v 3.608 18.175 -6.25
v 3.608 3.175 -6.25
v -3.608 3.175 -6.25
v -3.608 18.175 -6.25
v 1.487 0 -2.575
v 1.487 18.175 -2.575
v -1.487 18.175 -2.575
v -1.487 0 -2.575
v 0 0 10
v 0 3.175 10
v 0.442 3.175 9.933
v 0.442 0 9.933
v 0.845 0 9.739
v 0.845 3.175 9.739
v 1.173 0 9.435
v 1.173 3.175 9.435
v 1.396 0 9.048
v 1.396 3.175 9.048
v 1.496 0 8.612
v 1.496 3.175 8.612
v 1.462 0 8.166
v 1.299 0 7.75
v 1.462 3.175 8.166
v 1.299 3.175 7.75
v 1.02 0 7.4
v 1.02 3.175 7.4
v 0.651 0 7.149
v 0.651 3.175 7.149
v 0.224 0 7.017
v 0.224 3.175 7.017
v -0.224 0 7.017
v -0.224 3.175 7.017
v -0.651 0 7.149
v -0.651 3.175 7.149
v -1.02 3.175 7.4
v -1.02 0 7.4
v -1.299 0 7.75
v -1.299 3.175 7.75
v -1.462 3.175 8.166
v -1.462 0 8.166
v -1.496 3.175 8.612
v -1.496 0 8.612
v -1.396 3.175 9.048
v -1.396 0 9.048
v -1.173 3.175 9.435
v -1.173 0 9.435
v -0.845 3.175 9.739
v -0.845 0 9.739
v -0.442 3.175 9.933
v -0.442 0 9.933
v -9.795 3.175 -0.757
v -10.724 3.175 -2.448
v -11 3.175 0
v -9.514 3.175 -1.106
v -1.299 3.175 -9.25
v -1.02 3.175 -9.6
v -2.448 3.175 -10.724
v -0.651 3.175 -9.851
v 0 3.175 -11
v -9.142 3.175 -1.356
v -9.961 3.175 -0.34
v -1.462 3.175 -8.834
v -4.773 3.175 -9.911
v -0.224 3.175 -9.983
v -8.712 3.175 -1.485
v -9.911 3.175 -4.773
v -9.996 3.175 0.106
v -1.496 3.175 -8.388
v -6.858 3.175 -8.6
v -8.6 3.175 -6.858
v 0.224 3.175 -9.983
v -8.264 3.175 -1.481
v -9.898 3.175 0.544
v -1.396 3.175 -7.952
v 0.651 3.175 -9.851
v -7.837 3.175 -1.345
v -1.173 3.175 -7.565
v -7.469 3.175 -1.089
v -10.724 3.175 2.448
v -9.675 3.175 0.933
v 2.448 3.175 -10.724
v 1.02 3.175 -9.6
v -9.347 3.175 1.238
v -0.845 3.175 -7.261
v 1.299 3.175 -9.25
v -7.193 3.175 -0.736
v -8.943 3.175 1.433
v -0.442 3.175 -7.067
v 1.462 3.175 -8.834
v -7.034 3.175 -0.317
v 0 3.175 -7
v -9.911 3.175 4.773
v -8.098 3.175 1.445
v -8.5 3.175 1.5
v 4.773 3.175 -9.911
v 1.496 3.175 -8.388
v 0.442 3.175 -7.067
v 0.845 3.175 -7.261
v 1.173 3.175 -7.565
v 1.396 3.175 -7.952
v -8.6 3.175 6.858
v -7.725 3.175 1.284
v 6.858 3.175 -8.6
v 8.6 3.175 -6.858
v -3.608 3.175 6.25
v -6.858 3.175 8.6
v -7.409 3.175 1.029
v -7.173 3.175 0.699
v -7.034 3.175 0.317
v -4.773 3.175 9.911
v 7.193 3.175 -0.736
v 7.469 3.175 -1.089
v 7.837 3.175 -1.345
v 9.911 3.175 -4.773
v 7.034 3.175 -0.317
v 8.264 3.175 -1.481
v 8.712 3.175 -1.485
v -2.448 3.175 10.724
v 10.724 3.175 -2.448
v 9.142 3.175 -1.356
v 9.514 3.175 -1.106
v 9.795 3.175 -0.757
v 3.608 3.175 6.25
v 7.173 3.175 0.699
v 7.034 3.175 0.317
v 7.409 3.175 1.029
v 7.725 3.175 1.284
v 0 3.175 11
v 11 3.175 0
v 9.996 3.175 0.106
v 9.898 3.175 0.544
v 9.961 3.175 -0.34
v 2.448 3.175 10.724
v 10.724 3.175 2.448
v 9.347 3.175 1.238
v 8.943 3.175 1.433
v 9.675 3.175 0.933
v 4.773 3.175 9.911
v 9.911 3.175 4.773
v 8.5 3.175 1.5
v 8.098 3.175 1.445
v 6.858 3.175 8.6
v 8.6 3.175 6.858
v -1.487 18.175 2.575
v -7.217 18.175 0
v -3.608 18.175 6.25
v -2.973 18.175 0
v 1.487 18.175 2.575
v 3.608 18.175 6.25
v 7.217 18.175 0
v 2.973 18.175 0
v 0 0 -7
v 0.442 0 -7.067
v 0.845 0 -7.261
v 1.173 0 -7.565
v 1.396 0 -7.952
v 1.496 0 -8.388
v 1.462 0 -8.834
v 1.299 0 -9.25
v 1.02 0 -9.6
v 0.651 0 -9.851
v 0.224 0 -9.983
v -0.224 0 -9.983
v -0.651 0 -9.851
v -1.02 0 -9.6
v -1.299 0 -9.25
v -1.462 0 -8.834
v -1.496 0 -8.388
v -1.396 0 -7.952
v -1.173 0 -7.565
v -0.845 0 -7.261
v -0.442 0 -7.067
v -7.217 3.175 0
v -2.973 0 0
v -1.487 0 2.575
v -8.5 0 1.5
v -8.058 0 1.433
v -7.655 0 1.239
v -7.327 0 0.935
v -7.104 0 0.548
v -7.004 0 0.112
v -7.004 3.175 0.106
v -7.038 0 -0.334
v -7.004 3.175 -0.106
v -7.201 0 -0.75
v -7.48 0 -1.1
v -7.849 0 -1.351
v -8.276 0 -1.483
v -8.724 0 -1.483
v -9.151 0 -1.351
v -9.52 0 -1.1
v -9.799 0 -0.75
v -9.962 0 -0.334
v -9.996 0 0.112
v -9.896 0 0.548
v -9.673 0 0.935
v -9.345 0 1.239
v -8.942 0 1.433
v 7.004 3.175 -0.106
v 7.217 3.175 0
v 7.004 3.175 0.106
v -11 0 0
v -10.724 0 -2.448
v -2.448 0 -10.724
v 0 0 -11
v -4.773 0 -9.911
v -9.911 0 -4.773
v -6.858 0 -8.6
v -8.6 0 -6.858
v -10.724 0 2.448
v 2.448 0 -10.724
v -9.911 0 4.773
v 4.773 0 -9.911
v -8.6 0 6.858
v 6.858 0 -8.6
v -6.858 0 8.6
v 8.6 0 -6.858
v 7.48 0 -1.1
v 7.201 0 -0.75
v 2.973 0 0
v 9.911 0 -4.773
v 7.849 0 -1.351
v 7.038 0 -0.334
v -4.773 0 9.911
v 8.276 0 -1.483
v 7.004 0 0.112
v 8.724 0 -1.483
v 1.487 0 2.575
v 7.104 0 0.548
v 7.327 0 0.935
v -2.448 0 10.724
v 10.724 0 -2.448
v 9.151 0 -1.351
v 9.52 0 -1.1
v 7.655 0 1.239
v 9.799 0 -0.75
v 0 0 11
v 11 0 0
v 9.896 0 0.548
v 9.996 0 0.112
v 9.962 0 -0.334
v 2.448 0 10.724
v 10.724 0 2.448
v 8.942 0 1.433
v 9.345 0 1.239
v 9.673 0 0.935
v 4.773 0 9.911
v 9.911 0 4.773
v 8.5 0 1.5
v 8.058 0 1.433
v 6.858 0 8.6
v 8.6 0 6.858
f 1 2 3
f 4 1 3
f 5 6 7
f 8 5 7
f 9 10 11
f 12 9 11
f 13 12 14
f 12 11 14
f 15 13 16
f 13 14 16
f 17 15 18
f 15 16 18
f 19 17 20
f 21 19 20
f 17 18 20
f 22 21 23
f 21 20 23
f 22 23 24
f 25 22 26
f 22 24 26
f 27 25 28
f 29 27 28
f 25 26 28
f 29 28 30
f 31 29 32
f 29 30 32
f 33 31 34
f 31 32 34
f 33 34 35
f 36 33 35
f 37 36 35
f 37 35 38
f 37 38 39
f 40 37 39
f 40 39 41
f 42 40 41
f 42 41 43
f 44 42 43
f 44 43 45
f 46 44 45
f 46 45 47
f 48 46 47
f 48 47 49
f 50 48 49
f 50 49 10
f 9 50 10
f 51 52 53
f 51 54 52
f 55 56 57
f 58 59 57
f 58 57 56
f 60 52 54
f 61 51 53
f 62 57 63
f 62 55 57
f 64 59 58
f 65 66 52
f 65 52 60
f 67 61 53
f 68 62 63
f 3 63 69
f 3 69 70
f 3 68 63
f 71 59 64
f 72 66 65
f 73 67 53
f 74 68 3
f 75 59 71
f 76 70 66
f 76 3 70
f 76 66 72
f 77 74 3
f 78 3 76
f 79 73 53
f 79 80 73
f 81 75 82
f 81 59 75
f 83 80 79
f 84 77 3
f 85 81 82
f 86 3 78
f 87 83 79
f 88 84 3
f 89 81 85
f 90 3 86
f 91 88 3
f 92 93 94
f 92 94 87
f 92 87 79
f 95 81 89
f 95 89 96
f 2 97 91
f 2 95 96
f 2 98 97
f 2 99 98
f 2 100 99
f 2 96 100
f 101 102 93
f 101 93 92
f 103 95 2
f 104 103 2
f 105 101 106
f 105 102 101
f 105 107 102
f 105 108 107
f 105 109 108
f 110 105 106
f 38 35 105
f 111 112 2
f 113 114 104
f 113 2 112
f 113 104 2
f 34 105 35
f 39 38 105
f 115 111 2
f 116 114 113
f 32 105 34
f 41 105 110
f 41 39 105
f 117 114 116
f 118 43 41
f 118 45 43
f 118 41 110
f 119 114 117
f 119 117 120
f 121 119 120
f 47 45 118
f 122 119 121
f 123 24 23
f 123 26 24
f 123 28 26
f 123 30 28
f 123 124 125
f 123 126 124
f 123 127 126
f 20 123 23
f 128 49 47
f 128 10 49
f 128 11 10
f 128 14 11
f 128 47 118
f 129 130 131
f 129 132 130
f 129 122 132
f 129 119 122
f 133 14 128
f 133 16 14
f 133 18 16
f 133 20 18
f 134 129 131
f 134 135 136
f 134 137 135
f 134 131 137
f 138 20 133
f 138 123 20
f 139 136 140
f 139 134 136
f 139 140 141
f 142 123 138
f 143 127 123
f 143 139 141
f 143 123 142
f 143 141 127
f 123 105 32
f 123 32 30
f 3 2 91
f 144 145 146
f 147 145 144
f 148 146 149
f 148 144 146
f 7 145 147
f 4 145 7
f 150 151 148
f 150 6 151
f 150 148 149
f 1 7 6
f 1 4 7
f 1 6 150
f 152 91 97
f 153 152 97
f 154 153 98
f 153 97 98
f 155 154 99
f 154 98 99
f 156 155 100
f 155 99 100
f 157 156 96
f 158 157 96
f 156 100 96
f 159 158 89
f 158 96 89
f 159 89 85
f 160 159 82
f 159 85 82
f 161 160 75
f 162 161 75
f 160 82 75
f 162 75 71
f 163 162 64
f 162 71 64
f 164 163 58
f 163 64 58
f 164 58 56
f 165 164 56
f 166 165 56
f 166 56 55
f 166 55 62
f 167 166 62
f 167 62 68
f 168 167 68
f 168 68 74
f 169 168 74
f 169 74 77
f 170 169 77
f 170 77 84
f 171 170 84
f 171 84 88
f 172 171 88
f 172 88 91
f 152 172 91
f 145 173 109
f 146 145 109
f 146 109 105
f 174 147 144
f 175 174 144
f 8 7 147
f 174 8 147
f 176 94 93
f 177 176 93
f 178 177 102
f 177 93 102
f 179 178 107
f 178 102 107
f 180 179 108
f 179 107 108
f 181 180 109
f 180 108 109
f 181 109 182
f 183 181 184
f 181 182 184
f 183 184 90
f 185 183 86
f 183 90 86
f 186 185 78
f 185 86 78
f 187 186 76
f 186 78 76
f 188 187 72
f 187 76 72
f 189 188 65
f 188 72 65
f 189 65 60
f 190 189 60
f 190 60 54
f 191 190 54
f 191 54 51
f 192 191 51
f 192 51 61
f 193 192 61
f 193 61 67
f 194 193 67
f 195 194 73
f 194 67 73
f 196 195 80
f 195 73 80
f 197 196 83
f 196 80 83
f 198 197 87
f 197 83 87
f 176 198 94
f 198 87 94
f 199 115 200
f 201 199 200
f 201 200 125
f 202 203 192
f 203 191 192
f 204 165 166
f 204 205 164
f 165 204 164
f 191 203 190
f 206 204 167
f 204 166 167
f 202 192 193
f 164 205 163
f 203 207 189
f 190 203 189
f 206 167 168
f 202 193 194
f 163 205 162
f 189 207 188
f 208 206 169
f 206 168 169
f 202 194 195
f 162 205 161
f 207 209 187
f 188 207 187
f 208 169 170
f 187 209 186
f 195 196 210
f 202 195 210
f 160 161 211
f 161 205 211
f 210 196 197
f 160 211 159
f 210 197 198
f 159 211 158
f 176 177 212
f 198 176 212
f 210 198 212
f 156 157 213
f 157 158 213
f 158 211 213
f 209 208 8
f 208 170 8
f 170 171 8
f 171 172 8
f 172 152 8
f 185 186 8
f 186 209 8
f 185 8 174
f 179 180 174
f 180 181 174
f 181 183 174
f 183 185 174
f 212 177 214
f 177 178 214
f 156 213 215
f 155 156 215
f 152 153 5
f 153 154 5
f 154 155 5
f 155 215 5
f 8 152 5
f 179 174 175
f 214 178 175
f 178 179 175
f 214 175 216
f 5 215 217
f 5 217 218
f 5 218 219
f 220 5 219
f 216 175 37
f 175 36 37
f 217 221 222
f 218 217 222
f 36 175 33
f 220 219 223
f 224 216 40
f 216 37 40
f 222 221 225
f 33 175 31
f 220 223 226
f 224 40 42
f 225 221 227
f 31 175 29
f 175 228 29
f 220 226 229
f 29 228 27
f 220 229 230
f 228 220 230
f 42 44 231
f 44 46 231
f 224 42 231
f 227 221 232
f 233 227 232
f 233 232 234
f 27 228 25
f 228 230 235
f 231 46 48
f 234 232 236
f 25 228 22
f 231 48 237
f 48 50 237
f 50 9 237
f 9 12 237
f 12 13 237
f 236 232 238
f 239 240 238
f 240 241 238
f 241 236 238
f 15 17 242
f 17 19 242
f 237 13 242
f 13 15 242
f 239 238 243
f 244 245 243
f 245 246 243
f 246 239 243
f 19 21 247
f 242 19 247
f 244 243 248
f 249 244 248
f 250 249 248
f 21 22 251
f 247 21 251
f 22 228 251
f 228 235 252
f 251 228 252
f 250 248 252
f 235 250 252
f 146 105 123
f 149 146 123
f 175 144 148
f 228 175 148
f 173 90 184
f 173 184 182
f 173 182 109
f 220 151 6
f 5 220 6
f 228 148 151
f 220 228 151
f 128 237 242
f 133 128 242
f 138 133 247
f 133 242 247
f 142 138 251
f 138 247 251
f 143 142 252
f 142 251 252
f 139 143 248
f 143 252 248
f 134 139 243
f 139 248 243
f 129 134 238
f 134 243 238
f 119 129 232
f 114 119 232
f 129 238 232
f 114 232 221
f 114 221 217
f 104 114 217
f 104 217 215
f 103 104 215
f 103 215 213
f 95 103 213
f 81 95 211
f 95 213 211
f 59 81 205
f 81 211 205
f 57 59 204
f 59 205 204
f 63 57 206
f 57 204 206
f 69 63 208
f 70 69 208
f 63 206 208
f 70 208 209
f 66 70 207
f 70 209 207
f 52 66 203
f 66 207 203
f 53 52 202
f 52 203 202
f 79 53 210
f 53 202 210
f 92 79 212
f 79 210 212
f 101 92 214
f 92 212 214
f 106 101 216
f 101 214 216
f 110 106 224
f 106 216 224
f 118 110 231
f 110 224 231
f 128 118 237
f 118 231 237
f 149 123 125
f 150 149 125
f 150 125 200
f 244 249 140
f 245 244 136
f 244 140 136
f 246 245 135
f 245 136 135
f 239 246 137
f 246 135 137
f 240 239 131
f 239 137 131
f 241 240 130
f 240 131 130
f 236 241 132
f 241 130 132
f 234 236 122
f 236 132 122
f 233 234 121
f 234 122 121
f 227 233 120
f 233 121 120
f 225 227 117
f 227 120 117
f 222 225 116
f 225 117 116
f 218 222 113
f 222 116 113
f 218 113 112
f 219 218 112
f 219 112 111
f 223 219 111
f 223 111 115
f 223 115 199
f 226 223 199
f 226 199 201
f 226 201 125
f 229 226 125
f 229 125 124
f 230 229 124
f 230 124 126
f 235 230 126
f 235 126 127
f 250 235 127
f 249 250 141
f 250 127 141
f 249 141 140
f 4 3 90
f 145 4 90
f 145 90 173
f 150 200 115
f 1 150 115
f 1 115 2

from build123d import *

# Parameters (mm, degrees)
SKETCH1_R           = 11
BOSS_EXTRUDE1_DEPTH = 3.175
BOSS_EXTRUDE2_DEPTH = 15
CUT_EXTRUDE2_DEPTH  = 28
SKETCH6_R           = 1.5
CUT_EXTRUDE3_DEPTH  = 8


with BuildPart() as part:
    # Sketch1 → Boss-Extrude1 (new body)
    with BuildSketch(Plane(origin=(0, 0, 0), x_dir=(1, 0, 0), z_dir=(0, 1, 0))):
        with Locations(Location((0, 0, 0), (0, 0, 270))):
            Circle(SKETCH1_R)
    extrude(amount=BOSS_EXTRUDE1_DEPTH)

    # Sketch2 → Boss-Extrude2 (add)
    with BuildSketch(Plane(origin=(0, 3.175, 0), x_dir=(1, 0, 0), z_dir=(0, 1, 0))):
        Polygon((3.608439182, -6.25), (7.216878365, 0), (3.608439182, 6.25), (-3.608439182, 6.25), (-7.216878365, 0), (-3.608439182, -6.25), align=None)
    extrude(amount=BOSS_EXTRUDE2_DEPTH)

    # Sketch3 → Cut-Extrude2 (cut)
    with BuildSketch(Plane(origin=(0, 18.175, 0), x_dir=(1, 0, 0), z_dir=(0, 1, 0))):
        Polygon((1.486676943, -2.575), (2.973353886, 0), (1.486676943, 2.575), (-1.486676943, 2.575), (-2.973353886, 0), (-1.486676943, -2.575), align=None)
    extrude(amount=-CUT_EXTRUDE2_DEPTH, mode=Mode.SUBTRACT)

    # Sketch6 → Cut-Extrude3 (cut)
    with BuildSketch(Plane(origin=(0, 3.175, 0), x_dir=(1, 0, 0), z_dir=(0, 1, 0))):
        with Locations(Location((0, 8.5, 0), (0, 0, 270))):
            Circle(SKETCH6_R)
        with Locations(Location((8.5, 0, 0), (0, 0, 270))):
            Circle(SKETCH6_R)
        with Locations(Location((0, -8.5, 0), (0, 0, 270))):
            Circle(SKETCH6_R)
        with Locations(Location((-8.5, 0, 0), (0, 0, 270))):
            Circle(SKETCH6_R)
    extrude(amount=-CUT_EXTRUDE3_DEPTH, mode=Mode.SUBTRACT)


solid = part.part
